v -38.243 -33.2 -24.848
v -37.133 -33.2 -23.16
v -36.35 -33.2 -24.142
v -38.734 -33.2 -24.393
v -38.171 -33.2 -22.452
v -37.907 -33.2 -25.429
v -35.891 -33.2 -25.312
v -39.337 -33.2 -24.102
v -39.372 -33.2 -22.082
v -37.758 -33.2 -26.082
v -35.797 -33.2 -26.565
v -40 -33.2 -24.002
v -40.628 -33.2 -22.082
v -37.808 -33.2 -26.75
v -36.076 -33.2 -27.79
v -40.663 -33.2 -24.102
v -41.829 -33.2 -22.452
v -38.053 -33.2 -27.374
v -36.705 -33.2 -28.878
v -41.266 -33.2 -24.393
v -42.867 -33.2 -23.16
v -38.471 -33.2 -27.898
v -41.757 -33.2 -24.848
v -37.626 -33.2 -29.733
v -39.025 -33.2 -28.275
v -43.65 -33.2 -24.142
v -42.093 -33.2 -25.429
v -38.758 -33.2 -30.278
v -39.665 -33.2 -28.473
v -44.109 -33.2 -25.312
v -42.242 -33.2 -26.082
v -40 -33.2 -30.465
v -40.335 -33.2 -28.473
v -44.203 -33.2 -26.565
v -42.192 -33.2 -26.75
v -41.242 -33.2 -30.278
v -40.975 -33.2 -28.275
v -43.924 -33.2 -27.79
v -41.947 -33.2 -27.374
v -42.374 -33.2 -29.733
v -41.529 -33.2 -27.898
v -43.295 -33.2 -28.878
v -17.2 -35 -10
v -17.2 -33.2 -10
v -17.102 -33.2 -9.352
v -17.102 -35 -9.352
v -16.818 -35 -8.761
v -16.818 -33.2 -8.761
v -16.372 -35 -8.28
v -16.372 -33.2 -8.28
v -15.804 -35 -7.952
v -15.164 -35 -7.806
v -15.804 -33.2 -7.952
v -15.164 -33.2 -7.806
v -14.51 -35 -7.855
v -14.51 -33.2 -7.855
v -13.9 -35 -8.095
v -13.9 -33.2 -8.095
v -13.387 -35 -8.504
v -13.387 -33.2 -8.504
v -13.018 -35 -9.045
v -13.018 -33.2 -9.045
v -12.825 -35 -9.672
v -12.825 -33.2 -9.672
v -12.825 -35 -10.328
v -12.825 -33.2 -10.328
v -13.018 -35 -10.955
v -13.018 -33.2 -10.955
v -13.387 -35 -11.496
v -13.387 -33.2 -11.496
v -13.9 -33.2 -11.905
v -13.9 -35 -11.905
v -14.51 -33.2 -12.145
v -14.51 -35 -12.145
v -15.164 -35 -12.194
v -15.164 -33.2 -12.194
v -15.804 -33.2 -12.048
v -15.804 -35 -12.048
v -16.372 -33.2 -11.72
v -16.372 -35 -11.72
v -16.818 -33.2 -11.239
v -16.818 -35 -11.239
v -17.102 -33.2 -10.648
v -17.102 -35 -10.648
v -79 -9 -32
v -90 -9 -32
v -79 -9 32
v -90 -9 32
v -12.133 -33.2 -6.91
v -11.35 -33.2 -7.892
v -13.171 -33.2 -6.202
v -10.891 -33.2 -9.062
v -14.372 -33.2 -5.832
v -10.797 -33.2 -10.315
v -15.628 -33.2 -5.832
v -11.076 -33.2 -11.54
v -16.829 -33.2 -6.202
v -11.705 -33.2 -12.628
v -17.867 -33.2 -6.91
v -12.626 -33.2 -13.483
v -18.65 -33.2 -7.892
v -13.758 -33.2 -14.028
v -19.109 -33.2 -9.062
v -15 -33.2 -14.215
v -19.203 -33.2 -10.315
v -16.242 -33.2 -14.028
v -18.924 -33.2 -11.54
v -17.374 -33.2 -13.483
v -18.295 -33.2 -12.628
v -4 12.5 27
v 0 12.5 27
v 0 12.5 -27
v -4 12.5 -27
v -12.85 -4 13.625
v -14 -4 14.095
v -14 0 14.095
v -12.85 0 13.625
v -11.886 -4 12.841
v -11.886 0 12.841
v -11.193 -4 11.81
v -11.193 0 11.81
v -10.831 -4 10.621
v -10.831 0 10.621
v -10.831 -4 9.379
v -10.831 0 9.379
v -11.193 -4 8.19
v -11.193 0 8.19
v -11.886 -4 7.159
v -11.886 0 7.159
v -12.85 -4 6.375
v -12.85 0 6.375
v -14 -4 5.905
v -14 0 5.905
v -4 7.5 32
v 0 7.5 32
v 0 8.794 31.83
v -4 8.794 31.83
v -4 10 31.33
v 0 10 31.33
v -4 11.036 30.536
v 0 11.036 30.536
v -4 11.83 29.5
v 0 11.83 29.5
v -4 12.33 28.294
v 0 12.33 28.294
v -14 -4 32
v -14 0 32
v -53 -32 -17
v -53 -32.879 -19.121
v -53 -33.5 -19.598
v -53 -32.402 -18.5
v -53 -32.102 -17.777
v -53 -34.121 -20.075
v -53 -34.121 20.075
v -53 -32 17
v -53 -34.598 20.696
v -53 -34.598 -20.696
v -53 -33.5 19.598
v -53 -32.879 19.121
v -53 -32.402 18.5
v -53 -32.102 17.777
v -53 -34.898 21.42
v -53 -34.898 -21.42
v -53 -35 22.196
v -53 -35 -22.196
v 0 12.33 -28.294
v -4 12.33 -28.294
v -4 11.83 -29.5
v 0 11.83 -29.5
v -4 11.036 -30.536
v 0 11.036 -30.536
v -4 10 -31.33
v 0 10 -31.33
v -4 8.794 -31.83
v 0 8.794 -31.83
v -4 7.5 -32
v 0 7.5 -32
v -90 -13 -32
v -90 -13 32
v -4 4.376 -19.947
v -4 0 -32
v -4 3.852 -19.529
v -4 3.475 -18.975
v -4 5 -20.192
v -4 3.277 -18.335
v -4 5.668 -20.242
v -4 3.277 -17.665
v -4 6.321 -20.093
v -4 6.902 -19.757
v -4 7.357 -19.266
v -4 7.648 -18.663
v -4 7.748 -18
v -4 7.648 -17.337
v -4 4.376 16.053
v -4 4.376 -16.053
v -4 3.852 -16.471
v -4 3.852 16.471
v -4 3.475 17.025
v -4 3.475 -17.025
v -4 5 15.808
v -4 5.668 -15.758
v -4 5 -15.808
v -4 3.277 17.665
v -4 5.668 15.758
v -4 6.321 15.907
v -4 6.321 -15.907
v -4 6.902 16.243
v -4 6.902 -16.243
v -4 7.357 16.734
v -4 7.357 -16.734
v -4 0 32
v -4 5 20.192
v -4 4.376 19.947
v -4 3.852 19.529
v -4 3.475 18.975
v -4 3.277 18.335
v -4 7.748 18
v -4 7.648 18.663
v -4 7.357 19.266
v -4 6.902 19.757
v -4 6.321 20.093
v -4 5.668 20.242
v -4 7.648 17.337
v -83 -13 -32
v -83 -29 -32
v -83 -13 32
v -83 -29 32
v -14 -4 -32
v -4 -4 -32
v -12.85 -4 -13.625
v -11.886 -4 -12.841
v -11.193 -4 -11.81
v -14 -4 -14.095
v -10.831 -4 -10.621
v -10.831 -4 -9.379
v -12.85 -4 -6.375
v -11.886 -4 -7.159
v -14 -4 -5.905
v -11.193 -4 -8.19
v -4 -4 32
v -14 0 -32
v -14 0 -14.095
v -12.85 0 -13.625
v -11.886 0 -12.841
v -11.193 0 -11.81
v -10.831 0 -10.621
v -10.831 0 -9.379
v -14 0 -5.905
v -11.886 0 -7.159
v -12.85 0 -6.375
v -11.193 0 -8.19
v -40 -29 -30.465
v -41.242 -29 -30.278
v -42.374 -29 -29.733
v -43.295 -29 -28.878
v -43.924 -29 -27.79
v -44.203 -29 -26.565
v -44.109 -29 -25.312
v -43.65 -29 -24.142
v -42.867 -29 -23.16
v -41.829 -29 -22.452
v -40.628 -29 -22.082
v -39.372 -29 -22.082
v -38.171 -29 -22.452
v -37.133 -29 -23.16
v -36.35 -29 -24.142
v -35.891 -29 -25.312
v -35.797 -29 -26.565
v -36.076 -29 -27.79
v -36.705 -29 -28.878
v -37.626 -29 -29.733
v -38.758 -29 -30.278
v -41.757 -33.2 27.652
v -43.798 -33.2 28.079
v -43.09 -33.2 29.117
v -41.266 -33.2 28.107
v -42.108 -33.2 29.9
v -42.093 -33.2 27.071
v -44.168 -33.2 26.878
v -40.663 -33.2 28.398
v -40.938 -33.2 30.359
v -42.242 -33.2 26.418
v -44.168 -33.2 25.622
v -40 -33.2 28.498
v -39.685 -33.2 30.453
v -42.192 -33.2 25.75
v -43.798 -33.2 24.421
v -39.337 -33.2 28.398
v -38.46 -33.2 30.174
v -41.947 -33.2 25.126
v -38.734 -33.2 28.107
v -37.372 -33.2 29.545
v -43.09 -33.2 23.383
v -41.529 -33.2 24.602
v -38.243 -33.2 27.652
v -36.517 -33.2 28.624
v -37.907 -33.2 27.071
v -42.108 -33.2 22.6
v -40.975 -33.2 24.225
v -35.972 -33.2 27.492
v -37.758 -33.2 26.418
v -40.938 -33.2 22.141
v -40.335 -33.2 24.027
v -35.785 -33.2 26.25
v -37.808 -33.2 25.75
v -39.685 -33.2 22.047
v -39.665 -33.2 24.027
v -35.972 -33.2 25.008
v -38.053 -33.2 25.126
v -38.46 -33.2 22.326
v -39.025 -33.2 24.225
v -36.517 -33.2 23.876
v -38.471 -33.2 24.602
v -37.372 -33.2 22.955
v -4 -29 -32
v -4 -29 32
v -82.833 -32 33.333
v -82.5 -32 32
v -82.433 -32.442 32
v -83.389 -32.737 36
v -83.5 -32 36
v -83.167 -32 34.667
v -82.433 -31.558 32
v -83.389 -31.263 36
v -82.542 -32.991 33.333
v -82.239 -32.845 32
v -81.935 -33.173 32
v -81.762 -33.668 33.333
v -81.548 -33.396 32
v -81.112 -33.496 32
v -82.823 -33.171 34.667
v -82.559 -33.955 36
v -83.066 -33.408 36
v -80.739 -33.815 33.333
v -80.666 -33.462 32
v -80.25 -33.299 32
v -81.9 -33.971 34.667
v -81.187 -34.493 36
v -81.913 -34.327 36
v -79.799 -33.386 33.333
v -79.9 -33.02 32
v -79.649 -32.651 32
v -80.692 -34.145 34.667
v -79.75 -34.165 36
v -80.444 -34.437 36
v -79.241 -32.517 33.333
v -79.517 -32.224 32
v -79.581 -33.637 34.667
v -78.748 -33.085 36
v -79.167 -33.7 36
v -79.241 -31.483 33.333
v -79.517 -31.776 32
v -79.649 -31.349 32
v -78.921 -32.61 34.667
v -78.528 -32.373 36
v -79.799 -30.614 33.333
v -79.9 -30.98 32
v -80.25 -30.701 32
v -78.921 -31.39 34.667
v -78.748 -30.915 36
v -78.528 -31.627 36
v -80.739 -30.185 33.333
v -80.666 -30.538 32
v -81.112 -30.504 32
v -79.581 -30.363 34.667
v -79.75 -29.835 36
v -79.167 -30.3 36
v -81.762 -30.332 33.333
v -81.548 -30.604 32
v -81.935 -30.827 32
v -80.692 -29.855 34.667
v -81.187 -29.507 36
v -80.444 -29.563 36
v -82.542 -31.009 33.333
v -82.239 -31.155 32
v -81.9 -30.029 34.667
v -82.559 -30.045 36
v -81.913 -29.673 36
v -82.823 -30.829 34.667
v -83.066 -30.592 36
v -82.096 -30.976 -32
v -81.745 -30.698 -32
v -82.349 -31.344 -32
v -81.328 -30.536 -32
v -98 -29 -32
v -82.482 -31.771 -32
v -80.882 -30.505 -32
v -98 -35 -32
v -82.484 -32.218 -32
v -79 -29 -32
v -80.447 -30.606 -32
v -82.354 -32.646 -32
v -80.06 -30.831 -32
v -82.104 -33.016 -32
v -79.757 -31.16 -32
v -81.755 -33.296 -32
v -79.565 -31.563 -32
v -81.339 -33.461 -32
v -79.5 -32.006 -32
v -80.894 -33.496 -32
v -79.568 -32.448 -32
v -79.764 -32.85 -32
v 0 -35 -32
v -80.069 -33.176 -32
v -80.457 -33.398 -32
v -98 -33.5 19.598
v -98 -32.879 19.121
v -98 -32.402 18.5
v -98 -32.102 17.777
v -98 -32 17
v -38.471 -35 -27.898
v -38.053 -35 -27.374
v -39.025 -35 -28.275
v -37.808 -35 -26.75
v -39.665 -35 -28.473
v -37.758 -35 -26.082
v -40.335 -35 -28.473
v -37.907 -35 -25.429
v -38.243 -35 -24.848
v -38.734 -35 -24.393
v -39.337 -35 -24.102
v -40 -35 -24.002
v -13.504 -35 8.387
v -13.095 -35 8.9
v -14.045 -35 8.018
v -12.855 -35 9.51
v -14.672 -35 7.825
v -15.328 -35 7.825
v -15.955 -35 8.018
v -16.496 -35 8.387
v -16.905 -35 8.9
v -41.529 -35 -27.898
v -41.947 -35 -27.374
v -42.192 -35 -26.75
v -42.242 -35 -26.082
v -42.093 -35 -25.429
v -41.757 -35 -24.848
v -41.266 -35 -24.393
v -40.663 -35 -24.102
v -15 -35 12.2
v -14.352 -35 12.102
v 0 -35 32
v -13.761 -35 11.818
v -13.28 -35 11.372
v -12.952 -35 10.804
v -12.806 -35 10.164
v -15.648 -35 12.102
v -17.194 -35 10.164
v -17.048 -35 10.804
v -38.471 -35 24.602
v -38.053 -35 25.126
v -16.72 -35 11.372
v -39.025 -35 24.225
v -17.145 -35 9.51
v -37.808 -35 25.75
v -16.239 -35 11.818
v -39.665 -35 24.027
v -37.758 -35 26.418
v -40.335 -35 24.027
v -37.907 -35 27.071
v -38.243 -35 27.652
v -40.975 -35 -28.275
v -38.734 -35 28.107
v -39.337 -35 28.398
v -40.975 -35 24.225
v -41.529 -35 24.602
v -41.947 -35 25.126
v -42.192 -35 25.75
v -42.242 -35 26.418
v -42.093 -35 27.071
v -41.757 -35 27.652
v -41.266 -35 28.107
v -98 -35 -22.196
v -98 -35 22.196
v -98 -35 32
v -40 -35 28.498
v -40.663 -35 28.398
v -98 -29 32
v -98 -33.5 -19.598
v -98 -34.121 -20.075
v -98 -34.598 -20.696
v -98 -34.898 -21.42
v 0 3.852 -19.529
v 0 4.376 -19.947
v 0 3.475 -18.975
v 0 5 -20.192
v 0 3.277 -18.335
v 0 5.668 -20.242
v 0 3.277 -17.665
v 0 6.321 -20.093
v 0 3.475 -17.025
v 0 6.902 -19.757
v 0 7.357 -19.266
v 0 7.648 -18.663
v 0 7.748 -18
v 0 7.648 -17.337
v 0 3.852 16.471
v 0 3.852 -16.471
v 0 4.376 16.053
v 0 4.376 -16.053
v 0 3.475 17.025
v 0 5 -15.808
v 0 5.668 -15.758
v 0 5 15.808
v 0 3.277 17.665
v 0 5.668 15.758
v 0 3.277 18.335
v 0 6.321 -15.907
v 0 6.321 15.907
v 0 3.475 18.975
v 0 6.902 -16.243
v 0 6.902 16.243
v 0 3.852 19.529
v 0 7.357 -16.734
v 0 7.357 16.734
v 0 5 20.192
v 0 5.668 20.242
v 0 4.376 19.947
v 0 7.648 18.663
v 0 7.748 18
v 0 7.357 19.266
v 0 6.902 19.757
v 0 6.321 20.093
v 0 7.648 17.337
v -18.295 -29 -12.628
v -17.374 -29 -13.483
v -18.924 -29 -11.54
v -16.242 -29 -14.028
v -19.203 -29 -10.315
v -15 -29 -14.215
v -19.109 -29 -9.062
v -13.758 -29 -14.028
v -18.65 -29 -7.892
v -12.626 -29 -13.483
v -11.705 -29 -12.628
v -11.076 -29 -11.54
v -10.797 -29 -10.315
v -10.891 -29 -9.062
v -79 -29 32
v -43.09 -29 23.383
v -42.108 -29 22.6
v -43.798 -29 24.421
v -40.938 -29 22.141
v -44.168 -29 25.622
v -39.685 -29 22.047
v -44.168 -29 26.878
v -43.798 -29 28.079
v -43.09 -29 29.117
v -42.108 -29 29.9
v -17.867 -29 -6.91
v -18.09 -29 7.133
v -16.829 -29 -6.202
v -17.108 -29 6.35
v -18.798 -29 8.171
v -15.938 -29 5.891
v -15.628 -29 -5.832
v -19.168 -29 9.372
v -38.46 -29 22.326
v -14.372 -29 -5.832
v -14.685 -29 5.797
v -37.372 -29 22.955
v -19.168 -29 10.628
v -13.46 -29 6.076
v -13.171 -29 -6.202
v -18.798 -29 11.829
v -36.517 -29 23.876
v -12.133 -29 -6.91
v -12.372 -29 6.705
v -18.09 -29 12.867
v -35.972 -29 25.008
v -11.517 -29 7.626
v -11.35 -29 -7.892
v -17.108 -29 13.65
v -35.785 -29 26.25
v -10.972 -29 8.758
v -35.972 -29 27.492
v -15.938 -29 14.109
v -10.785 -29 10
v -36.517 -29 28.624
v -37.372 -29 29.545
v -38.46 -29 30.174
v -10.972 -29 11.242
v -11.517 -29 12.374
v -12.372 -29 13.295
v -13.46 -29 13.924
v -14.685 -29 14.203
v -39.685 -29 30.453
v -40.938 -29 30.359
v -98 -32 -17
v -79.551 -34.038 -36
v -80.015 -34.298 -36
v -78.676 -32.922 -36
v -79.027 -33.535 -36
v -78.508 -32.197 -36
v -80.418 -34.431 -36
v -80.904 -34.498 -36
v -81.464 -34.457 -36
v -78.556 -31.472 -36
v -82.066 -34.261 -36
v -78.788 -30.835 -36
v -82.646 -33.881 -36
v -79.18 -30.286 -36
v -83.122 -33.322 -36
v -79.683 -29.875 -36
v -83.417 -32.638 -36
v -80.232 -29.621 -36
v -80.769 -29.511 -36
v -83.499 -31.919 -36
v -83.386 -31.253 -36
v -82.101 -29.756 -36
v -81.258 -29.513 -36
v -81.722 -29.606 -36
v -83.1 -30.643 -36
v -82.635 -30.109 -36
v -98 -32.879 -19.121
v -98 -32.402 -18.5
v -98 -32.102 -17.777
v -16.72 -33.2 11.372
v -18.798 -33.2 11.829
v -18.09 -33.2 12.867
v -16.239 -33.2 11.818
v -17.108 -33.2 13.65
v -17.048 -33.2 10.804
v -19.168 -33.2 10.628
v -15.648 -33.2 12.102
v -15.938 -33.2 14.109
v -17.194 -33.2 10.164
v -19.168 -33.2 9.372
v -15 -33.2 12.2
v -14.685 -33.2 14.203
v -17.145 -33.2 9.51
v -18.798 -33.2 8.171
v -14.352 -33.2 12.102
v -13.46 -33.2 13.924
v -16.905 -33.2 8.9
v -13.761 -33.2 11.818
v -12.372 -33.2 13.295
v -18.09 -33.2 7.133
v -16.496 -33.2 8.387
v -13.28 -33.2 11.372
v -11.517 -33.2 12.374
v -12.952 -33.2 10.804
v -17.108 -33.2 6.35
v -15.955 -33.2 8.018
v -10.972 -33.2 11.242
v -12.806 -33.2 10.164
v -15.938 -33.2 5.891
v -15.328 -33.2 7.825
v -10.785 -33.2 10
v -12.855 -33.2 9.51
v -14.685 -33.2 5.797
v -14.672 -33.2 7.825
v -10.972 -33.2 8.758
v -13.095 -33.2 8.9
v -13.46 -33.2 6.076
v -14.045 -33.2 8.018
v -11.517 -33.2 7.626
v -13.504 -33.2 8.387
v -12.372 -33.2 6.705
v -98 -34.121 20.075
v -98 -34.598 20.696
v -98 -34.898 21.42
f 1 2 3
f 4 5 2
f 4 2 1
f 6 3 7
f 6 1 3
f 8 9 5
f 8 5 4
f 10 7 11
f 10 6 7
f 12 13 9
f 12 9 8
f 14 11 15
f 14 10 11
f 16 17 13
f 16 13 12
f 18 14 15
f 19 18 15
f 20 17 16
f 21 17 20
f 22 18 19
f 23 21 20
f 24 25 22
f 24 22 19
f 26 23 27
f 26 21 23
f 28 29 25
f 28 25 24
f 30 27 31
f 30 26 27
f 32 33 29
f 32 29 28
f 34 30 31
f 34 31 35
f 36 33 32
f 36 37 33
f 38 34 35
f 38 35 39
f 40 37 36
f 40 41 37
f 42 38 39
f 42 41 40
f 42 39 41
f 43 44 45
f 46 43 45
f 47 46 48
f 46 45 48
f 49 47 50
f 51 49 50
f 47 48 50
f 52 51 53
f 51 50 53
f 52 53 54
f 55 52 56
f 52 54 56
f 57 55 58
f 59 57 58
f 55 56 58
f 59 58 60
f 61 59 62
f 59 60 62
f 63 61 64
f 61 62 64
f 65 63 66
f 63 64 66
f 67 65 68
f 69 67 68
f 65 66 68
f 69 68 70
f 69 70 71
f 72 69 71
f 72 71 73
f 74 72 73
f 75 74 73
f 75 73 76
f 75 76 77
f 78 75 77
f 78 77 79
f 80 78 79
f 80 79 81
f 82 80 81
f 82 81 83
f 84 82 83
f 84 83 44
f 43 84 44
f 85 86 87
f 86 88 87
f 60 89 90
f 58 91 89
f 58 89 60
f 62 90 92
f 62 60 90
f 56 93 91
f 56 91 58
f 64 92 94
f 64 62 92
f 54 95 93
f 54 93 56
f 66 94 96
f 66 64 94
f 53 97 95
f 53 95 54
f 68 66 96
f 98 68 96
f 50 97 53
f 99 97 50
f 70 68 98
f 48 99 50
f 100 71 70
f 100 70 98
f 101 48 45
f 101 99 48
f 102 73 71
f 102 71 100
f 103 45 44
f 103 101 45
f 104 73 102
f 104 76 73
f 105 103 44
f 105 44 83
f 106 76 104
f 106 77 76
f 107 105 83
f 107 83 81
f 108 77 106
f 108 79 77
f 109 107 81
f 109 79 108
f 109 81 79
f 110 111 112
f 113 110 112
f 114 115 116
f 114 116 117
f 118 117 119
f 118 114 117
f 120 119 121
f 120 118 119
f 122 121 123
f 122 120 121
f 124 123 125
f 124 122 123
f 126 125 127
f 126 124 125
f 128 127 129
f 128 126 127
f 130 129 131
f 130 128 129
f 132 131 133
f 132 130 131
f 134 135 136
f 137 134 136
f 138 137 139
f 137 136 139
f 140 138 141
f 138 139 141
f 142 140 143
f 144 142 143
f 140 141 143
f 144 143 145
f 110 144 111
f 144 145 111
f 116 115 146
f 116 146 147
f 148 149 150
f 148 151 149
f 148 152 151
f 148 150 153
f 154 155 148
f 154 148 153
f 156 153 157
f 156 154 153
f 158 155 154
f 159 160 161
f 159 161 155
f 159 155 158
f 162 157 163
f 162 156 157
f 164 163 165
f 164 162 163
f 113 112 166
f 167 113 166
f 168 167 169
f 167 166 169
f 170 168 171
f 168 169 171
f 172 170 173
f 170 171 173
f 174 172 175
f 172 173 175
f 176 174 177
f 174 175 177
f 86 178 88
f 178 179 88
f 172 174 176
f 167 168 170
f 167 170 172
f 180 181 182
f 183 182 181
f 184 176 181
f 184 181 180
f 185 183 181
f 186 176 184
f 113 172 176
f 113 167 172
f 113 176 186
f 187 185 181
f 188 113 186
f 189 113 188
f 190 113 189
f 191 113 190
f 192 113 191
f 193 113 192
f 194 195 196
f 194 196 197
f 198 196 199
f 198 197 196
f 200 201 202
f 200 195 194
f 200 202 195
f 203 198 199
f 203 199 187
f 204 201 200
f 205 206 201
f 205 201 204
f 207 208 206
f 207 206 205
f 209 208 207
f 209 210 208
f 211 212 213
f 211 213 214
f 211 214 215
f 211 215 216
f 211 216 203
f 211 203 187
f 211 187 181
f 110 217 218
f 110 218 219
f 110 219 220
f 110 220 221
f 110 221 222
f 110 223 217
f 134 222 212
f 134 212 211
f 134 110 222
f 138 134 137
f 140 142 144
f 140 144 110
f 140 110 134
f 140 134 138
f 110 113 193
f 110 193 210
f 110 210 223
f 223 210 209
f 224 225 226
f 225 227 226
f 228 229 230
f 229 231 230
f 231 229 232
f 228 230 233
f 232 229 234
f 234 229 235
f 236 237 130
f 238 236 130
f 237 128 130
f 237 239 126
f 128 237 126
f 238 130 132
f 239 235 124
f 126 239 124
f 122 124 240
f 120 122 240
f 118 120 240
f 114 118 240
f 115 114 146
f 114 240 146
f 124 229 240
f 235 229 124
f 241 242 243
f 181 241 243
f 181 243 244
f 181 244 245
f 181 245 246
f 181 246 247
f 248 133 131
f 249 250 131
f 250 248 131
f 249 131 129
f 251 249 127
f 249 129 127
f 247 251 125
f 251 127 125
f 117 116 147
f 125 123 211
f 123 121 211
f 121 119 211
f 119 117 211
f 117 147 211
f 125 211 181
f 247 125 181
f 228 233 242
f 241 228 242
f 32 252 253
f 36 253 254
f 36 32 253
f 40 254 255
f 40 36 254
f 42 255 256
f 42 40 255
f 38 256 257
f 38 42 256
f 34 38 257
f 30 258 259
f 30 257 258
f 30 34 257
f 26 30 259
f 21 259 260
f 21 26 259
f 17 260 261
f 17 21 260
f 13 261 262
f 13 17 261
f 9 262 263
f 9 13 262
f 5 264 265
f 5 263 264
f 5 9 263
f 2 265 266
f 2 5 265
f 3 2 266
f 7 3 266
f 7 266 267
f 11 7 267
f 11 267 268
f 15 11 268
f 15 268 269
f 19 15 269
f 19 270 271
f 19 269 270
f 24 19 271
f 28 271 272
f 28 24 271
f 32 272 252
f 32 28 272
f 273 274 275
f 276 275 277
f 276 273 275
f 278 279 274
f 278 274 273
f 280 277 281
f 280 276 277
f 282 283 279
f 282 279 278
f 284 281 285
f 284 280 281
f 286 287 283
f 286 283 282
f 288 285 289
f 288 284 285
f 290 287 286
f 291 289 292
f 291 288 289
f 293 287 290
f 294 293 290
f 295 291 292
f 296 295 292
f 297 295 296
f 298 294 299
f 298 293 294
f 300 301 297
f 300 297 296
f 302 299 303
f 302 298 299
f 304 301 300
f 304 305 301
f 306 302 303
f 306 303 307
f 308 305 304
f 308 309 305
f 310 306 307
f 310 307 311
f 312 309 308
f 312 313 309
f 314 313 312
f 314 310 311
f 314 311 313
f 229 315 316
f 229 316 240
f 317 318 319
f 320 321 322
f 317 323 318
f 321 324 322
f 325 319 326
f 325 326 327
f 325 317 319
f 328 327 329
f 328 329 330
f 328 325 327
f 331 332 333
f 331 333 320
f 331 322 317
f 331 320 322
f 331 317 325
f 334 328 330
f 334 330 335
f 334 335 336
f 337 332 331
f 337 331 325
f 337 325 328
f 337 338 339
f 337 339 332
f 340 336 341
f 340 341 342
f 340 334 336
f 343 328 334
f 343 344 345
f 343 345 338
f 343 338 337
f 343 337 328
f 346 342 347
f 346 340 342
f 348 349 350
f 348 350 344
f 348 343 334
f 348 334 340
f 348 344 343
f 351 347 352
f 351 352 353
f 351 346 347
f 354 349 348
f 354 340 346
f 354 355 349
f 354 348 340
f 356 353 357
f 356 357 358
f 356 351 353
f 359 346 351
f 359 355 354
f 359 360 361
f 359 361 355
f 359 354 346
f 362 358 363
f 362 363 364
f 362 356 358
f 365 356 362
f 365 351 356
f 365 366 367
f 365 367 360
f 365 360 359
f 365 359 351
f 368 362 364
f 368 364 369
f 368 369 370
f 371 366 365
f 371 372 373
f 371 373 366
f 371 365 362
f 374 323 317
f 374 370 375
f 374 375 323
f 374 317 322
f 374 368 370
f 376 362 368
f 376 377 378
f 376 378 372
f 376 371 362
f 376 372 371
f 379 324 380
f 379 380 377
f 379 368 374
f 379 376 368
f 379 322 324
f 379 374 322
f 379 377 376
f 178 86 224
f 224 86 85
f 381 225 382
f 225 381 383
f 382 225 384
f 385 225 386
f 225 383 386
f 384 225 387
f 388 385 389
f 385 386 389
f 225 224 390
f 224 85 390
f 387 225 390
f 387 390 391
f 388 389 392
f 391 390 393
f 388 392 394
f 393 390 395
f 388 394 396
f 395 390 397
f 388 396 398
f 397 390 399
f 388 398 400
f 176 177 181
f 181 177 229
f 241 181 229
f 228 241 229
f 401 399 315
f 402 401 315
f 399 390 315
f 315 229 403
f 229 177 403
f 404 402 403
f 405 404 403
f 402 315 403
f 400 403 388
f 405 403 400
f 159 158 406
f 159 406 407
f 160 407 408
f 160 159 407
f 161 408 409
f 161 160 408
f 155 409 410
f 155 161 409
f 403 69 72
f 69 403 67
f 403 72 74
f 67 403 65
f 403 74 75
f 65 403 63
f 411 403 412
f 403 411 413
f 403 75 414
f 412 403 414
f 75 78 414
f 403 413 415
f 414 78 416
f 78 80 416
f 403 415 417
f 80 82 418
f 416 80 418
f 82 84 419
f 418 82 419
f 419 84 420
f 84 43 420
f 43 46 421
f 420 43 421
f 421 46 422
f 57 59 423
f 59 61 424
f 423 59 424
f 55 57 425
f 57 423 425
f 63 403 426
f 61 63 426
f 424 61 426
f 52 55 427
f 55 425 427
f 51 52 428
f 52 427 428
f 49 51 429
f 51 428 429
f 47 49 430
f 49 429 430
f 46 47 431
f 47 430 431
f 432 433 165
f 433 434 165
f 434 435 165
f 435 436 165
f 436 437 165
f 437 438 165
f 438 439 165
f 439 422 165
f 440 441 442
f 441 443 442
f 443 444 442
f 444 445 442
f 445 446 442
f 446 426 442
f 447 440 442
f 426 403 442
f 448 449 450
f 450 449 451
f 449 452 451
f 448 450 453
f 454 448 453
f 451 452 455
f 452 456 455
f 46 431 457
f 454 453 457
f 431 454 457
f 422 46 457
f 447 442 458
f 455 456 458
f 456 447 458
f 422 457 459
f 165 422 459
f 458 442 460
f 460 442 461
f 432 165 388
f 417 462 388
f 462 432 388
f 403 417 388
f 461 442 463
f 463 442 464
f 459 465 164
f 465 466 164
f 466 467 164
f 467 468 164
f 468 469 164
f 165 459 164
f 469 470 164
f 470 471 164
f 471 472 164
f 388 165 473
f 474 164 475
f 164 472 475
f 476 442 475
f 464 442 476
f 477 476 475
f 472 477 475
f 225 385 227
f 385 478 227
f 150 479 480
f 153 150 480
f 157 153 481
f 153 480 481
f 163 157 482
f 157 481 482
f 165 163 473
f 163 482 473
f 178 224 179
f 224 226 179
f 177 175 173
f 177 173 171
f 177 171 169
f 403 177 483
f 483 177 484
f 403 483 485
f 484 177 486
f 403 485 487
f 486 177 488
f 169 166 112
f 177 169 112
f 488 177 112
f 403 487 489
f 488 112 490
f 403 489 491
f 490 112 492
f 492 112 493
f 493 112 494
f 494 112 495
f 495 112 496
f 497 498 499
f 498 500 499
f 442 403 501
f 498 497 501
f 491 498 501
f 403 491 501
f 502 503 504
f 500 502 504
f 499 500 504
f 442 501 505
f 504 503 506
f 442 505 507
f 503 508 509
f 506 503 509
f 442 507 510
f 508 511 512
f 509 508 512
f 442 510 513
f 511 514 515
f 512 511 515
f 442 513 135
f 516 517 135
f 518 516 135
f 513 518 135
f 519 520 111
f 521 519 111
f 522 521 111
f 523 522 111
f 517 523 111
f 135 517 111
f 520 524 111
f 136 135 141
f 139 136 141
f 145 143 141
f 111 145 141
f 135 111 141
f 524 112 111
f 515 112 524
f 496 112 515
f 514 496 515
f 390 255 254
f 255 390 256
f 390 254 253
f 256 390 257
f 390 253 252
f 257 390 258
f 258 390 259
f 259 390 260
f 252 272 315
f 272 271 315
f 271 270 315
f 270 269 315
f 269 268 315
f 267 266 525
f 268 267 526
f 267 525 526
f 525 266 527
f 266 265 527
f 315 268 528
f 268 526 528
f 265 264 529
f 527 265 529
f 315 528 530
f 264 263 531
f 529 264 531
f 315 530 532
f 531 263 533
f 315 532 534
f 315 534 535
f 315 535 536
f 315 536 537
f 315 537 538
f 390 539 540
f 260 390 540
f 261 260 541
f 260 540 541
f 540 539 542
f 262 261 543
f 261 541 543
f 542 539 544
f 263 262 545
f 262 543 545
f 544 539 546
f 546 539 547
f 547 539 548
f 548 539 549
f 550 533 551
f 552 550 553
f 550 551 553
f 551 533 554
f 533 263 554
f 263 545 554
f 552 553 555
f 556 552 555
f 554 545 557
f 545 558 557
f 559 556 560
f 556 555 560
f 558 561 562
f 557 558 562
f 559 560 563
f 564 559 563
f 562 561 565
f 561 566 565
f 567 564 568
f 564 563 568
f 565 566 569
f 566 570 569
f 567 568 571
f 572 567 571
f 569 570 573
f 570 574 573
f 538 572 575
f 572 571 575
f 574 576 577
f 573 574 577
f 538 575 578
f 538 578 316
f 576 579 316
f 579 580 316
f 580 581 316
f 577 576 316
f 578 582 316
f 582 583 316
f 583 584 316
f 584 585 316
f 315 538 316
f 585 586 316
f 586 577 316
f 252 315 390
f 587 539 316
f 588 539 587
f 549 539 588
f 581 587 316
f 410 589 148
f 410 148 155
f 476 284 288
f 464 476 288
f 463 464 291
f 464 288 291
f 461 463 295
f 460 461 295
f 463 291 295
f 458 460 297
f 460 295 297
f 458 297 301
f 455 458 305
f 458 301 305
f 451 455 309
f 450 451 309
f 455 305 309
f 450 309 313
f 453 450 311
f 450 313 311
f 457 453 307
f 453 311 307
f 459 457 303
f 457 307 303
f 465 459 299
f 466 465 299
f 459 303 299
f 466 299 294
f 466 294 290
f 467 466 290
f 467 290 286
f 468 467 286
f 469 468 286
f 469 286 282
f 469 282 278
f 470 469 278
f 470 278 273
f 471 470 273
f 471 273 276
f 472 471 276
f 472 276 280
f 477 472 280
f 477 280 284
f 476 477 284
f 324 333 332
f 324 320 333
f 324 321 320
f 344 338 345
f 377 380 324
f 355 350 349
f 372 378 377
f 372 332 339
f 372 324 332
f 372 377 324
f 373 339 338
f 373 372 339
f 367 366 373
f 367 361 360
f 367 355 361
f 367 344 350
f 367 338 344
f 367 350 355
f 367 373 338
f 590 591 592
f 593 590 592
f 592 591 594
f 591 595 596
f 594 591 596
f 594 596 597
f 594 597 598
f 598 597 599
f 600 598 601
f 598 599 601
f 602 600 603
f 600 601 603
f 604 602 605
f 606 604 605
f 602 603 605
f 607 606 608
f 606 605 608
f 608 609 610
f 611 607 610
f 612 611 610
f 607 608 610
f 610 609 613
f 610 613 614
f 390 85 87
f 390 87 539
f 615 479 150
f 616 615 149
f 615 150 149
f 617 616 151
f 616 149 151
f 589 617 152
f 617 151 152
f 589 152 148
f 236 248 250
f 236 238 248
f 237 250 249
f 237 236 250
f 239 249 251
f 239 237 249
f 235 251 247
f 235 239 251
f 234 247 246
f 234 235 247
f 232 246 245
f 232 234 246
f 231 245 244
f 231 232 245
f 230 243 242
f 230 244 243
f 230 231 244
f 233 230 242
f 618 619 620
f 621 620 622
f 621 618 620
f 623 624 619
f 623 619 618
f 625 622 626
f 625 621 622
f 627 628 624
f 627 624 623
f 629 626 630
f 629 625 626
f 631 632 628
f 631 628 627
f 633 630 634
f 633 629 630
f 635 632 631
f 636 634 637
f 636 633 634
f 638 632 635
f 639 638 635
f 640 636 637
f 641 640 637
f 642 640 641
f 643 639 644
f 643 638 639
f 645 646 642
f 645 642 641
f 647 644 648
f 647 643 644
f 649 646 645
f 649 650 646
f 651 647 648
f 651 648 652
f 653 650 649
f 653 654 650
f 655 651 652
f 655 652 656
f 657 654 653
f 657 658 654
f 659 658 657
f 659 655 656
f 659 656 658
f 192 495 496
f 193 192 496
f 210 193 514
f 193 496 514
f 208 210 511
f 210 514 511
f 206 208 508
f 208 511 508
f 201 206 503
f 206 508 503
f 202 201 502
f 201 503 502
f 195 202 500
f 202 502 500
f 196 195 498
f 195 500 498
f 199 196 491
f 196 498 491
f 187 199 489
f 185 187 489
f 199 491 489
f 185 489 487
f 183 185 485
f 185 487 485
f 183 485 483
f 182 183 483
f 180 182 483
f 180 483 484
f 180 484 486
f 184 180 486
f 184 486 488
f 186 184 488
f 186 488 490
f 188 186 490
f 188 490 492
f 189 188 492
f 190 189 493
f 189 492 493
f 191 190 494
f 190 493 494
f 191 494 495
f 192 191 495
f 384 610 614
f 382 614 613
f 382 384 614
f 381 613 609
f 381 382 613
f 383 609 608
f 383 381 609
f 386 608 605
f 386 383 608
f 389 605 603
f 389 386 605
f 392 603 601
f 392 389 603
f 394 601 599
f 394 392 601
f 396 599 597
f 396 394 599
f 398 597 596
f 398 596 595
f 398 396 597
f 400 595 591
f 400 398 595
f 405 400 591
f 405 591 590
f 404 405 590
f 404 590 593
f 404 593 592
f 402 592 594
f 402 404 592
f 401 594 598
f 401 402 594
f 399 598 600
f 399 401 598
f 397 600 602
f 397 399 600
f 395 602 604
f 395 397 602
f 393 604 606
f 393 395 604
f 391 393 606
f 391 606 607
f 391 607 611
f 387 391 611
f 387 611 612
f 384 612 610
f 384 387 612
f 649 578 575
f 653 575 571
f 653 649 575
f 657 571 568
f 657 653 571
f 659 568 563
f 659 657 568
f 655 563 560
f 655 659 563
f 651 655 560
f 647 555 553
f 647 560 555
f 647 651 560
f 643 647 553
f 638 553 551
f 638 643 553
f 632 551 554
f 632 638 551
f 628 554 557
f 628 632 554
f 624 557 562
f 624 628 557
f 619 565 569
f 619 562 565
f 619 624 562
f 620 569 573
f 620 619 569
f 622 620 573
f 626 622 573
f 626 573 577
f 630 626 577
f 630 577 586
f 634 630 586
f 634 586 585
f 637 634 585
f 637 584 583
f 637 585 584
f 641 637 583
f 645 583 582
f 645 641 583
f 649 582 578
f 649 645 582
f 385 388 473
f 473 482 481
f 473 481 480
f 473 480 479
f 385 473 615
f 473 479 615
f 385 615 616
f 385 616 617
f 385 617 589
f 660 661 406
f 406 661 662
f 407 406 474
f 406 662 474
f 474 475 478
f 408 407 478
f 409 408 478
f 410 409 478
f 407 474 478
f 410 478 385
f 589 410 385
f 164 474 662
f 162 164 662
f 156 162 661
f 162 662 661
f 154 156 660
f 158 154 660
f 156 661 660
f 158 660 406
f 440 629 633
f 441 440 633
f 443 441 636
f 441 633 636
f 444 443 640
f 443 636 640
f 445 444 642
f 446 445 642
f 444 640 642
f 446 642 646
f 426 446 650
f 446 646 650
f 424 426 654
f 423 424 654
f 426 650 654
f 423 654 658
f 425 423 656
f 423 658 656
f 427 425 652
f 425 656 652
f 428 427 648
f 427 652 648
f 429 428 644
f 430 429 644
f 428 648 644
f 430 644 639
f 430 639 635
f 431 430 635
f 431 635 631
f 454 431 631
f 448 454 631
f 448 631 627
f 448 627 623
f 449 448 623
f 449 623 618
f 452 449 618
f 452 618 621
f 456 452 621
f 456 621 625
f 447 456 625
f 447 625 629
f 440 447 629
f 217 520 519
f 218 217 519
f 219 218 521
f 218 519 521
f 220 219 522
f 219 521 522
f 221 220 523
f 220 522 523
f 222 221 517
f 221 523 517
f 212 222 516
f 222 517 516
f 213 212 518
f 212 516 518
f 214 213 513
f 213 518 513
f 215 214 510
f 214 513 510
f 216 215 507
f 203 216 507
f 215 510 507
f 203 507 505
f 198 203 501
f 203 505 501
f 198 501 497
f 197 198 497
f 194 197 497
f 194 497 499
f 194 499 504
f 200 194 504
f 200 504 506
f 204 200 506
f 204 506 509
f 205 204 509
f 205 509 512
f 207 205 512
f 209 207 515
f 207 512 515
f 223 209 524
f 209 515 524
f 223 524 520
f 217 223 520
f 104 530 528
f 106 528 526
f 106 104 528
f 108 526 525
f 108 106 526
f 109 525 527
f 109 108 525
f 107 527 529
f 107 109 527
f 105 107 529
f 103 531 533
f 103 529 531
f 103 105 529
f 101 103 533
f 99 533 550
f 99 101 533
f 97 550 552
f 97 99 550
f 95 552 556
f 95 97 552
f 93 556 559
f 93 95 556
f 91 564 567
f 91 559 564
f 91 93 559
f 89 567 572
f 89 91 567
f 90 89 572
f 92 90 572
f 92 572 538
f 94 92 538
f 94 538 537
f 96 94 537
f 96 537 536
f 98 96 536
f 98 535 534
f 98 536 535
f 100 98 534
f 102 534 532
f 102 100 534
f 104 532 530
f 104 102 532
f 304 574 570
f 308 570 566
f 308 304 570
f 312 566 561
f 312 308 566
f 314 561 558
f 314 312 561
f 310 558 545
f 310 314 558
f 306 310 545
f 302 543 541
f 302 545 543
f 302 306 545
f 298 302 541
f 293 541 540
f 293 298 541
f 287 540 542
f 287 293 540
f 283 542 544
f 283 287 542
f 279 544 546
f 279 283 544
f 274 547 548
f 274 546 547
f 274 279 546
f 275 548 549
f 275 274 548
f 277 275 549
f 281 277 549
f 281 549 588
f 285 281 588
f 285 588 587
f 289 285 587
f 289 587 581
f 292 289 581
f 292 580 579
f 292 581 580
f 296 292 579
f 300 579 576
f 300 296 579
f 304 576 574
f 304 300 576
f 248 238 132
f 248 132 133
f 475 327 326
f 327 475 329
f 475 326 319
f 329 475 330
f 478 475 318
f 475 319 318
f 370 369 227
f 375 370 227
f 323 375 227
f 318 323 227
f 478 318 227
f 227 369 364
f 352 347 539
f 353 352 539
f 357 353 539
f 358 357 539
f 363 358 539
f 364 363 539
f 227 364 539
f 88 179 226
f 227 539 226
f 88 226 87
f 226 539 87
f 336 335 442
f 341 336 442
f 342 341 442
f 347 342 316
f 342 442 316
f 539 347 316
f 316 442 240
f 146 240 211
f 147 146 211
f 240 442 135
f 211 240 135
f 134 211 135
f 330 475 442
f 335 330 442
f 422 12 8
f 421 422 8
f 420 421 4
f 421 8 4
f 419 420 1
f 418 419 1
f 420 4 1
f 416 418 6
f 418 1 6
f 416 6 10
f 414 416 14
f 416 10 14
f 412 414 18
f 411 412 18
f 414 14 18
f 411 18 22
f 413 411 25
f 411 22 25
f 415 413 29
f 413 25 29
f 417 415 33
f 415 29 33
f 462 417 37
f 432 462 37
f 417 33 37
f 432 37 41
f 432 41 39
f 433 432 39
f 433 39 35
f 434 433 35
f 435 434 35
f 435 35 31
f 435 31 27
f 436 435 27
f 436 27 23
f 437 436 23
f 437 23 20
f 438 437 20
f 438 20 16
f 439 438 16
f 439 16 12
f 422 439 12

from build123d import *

# Parameters (mm, degrees)
EXTRUDE_BASE_DEPTH              = 32
SKETCH2_R                       = 2.2
SKETCH2_R_2                     = 2.2479
CUT_BOLT_HOLES_DEPTH            = 10
CUT_BOLT_HEAD_INSETS_DEPTH      = 40
CUT_BOLT_HEAD_INSETS_DEPTH_BACK = 4.2
SKETCH3_R                       = 4.215
SKETCH4_W                       = 40
SKETCH4_H                       = 3
CUT_TOP_CLEARANCE_SLOT_DEPTH    = 45
FILLET_CLEARANCE_SLOT_PT_1_R    = 3
FILLET_CLEARANCE_SLOT_PT_2_R    = 3
SKETCH5_R                       = 1.5
BOSS_EXTRUDE1_DEPTH             = 4
SKETCH6_R                       = 2.5
SKETCH7_R                       = 1.5
BOSS_EXTRUDE2_DEPTH             = 4
SKETCH9_R                       = 2.2479
BOSS_EXTRUDE3_DEPTH             = 4


with BuildPart() as part:
    # Sketch1 → Extrude-Base (new, symmetric)
    with BuildSketch(Plane.XY):
        Polygon((-14, 0), (0, 0), (0, -35), (-98, -35), (-98, -29), (-83, -29), (-83, -13), (-90, -13), (-90, -9), (-79, -9), (-79, -29), (-4, -29), (-4, -4), (-14, -4), align=None)
    extrude(amount=EXTRUDE_BASE_DEPTH, both=True)

    # Sketch2 → Cut-Bolt Holes (cut)
    with BuildSketch(Plane(origin=(0, -29, 0), x_dir=(1, 0, 0), z_dir=(0, 1, 0))):
        with Locations(Location((-15, -10, 0), (0, 0, 270))):
            Circle(SKETCH2_R)
        with Locations(Location((-15, 10, 0), (0, 0, 180))):
            Circle(SKETCH2_R)
        with Locations(Location((-40, 26.25, 0), (0, 0, 270))):
            Circle(SKETCH2_R_2)
        with Locations(Location((-40, -26.25, 0), (0, 0, 270))):
            Circle(SKETCH2_R_2)
    extrude(amount=-CUT_BOLT_HOLES_DEPTH, mode=Mode.SUBTRACT)

    # Sketch3 → Cut-Bolt Head Insets (cut, two sides: drawn at the far end of the back side and taken through both)
    with BuildSketch(Plane(origin=(0, -29, 0), x_dir=(1, 0, 0), z_dir=(0, 1, 0)).offset(-CUT_BOLT_HEAD_INSETS_DEPTH_BACK)):
        with Locations((-15, -10)):
            Circle(SKETCH3_R)
        with Locations((-40, -26.25)):
            Circle(SKETCH3_R)
        with Locations(Location((-15, 10, 0), (0, 0, 90))):
            Circle(SKETCH3_R)
        with Locations(Location((-40, 26.25, 0), (0, 0, 90))):
            Circle(SKETCH3_R)
    extrude(amount=CUT_BOLT_HEAD_INSETS_DEPTH + CUT_BOLT_HEAD_INSETS_DEPTH_BACK, mode=Mode.SUBTRACT)

    # Sketch4 → Cut-Top Clearance Slot (cut)
    with BuildSketch(Plane.ZY.offset(98)):
        with Locations((0, -33.5)):
            Rectangle(SKETCH4_W, SKETCH4_H)
    extrude(amount=-CUT_TOP_CLEARANCE_SLOT_DEPTH, mode=Mode.SUBTRACT)

    # Fillet-Clearance Slot Pt 1
    fillet_clearance_slot_pt_1_edges = [part.edges().sort_by_distance(p)[0] for p in [
        (-75.5, -32, 20),
        (-75.5, -32, -20),
    ]]
    fillet(fillet_clearance_slot_pt_1_edges, radius=FILLET_CLEARANCE_SLOT_PT_1_R - 0.0001)  # a hair under: the kernel refuses the full size

    # Fillet-Clearance Slot Pt 2
    # the kernel refuses this fillet: 3 mm, written as the material it takes off along each edge
    with BuildSketch(Plane(origin=(-103.490486718, -35, 20), x_dir=(0, 0, 1), z_dir=(1, 0, 0))) as fillet_clearance_slot_pt_2_piece_1:
        with BuildLine():
            CenterArc((2.196194687, -3), FILLET_CLEARANCE_SLOT_PT_2_R, 90, 60.000551337)
            Line((-0.401895958, -1.500025), (-0.661705022, -1.3500275))
            ThreePointArc((-0.661705022, -1.3500275), (-0.3, -0.0001), (-0.3, 0))
            Line((-0.3, 0), (0, 0.3))
            Line((0, 0.3), (2.196194687, 0.3))
            Line((2.196194687, 0.3), (2.196194687, 0))
        make_face()
    extrude(amount=50.490486718, mode=Mode.SUBTRACT)
    with BuildSketch(Plane(origin=(-103.490486718, -35, -20), x_dir=(0, 0.9659313848535173, 0.25879829936644894), z_dir=(1, 0, 0))) as fillet_clearance_slot_pt_2_piece_2:
        with BuildLine():
            CenterArc((2.329422704, -2.897768274), FILLET_CLEARANCE_SLOT_PT_2_R, 105.000679234, 60.000551337)
            Line((-0.56837145, -2.121373376), (-0.858150866, -2.043733886))
            Line((-0.858150866, -2.043733886), (-0.289779415, 0.07763949))
            Line((-0.289779415, 0.07763949), (0.07763949, 0.289779415))
            ThreePointArc((0.07763949, 0.289779415), (0.077736083, 0.289753536), (1.475282068, 0.289776827))
            Line((1.475282068, 0.289776827), (1.552931216, 0))
        make_face()
    extrude(amount=50.490486718, mode=Mode.SUBTRACT)

    # Sketch5 → Boss-Extrude1 (add)
    with BuildSketch(Plane.XY.offset(32)):
        with Locations(Location((-81, -32, 0), (0, 0, 180))):
            Circle(SKETCH5_R)
    extrude(amount=BOSS_EXTRUDE1_DEPTH)

    # Sketch6 → section 1 of loft2
    with BuildSketch(Plane.XY.offset(36), mode=Mode.PRIVATE) as loft2_s1:
        with Locations((-81, -32)):
            Circle(SKETCH6_R)
    # loft up to a face of the part (loft2)
    loft([Face(Wire([part.edges().sort_by_distance((-79.973179341, -33.093452941, 32))[0]])), loft2_s1.sketch])

    # Sketch7 → Boss-Extrude2 (add)
    with BuildSketch(Plane(origin=(0, 0, -32), x_dir=(-1, 0, 0), z_dir=(0, 0, -1))):
        with Locations((81, -32)):
            Circle(SKETCH7_R)
    extrude(amount=BOSS_EXTRUDE2_DEPTH)

    # Loft4: read off the stored shape, not the designer's step
    # Loft4: loft between two sections, ruled curve by curve
    loft4_from = [
        Edge.make_bspline([(-82.101258326, -29.755622559, -36), (-86.590013209, -31.95813921, -36), (-84.387496557, -36.446894093, -36), (-79.898741674, -34.244377441, -36), (-75.409986791, -32.04186079, -36), (-77.612503443, -27.553105907, -36), (-82.101258326, -29.755622559, -36)], [0, 0, 0, 0, 0.5, 0.5, 0.5, 1, 1, 1, 1], 3, [1, 0.333333333, 0.333333333, 1, 0.333333333, 0.333333333, 1]),
    ]
    loft4_to = [
        Edge.make_bspline([(-81.328134577, -30.536330741, -32), (-84.255473095, -31.192599896, -32), (-83.59920394, -34.119938413, -32), (-80.671865423, -33.463669259, -32), (-77.744526905, -32.807400104, -32), (-78.40079606, -29.880061587, -32), (-81.328134577, -30.536330741, -32)], [0, 0, 0, 0, 0.5, 0.5, 0.5, 1, 1, 1, 1], 3, [1, 0.333333333, 0.333333333, 1, 0.333333333, 0.333333333, 1]),
    ]
    loft4 = Solid(Shell([*[Face.make_surface_from_curves(loft4_from[k], loft4_to[k]) for k in range(1)], Face(Wire(loft4_from)), Face(Wire(loft4_to))]))
    add(loft4)

    # Sketch9 → Boss-Extrude3 (add)
    with BuildSketch(Plane(origin=(0, 0, 0), x_dir=(0, 0, -1), z_dir=(1, 0, 0))):
        with BuildLine():
            Line((32, 0), (-32, 0))
            Line((-32, 0), (-32, 7.5))
            ThreePointArc((-32, 7.5), (-30.535533906, 11.035533906), (-27, 12.5))
            Line((-27, 12.5), (27, 12.5))
            ThreePointArc((27, 12.5), (30.535533906, 11.035533906), (32, 7.5))
            Line((32, 7.5), (32, 0))
        make_face()
        with Locations(Location((-18, 5.5, 0), (0, 0, 90))):
            Circle(SKETCH9_R, mode=Mode.SUBTRACT)
        with Locations(Location((18, 5.5, 0), (0, 0, 90))):
            Circle(SKETCH9_R, mode=Mode.SUBTRACT)
    extrude(amount=-BOSS_EXTRUDE3_DEPTH)


solid = part.part
